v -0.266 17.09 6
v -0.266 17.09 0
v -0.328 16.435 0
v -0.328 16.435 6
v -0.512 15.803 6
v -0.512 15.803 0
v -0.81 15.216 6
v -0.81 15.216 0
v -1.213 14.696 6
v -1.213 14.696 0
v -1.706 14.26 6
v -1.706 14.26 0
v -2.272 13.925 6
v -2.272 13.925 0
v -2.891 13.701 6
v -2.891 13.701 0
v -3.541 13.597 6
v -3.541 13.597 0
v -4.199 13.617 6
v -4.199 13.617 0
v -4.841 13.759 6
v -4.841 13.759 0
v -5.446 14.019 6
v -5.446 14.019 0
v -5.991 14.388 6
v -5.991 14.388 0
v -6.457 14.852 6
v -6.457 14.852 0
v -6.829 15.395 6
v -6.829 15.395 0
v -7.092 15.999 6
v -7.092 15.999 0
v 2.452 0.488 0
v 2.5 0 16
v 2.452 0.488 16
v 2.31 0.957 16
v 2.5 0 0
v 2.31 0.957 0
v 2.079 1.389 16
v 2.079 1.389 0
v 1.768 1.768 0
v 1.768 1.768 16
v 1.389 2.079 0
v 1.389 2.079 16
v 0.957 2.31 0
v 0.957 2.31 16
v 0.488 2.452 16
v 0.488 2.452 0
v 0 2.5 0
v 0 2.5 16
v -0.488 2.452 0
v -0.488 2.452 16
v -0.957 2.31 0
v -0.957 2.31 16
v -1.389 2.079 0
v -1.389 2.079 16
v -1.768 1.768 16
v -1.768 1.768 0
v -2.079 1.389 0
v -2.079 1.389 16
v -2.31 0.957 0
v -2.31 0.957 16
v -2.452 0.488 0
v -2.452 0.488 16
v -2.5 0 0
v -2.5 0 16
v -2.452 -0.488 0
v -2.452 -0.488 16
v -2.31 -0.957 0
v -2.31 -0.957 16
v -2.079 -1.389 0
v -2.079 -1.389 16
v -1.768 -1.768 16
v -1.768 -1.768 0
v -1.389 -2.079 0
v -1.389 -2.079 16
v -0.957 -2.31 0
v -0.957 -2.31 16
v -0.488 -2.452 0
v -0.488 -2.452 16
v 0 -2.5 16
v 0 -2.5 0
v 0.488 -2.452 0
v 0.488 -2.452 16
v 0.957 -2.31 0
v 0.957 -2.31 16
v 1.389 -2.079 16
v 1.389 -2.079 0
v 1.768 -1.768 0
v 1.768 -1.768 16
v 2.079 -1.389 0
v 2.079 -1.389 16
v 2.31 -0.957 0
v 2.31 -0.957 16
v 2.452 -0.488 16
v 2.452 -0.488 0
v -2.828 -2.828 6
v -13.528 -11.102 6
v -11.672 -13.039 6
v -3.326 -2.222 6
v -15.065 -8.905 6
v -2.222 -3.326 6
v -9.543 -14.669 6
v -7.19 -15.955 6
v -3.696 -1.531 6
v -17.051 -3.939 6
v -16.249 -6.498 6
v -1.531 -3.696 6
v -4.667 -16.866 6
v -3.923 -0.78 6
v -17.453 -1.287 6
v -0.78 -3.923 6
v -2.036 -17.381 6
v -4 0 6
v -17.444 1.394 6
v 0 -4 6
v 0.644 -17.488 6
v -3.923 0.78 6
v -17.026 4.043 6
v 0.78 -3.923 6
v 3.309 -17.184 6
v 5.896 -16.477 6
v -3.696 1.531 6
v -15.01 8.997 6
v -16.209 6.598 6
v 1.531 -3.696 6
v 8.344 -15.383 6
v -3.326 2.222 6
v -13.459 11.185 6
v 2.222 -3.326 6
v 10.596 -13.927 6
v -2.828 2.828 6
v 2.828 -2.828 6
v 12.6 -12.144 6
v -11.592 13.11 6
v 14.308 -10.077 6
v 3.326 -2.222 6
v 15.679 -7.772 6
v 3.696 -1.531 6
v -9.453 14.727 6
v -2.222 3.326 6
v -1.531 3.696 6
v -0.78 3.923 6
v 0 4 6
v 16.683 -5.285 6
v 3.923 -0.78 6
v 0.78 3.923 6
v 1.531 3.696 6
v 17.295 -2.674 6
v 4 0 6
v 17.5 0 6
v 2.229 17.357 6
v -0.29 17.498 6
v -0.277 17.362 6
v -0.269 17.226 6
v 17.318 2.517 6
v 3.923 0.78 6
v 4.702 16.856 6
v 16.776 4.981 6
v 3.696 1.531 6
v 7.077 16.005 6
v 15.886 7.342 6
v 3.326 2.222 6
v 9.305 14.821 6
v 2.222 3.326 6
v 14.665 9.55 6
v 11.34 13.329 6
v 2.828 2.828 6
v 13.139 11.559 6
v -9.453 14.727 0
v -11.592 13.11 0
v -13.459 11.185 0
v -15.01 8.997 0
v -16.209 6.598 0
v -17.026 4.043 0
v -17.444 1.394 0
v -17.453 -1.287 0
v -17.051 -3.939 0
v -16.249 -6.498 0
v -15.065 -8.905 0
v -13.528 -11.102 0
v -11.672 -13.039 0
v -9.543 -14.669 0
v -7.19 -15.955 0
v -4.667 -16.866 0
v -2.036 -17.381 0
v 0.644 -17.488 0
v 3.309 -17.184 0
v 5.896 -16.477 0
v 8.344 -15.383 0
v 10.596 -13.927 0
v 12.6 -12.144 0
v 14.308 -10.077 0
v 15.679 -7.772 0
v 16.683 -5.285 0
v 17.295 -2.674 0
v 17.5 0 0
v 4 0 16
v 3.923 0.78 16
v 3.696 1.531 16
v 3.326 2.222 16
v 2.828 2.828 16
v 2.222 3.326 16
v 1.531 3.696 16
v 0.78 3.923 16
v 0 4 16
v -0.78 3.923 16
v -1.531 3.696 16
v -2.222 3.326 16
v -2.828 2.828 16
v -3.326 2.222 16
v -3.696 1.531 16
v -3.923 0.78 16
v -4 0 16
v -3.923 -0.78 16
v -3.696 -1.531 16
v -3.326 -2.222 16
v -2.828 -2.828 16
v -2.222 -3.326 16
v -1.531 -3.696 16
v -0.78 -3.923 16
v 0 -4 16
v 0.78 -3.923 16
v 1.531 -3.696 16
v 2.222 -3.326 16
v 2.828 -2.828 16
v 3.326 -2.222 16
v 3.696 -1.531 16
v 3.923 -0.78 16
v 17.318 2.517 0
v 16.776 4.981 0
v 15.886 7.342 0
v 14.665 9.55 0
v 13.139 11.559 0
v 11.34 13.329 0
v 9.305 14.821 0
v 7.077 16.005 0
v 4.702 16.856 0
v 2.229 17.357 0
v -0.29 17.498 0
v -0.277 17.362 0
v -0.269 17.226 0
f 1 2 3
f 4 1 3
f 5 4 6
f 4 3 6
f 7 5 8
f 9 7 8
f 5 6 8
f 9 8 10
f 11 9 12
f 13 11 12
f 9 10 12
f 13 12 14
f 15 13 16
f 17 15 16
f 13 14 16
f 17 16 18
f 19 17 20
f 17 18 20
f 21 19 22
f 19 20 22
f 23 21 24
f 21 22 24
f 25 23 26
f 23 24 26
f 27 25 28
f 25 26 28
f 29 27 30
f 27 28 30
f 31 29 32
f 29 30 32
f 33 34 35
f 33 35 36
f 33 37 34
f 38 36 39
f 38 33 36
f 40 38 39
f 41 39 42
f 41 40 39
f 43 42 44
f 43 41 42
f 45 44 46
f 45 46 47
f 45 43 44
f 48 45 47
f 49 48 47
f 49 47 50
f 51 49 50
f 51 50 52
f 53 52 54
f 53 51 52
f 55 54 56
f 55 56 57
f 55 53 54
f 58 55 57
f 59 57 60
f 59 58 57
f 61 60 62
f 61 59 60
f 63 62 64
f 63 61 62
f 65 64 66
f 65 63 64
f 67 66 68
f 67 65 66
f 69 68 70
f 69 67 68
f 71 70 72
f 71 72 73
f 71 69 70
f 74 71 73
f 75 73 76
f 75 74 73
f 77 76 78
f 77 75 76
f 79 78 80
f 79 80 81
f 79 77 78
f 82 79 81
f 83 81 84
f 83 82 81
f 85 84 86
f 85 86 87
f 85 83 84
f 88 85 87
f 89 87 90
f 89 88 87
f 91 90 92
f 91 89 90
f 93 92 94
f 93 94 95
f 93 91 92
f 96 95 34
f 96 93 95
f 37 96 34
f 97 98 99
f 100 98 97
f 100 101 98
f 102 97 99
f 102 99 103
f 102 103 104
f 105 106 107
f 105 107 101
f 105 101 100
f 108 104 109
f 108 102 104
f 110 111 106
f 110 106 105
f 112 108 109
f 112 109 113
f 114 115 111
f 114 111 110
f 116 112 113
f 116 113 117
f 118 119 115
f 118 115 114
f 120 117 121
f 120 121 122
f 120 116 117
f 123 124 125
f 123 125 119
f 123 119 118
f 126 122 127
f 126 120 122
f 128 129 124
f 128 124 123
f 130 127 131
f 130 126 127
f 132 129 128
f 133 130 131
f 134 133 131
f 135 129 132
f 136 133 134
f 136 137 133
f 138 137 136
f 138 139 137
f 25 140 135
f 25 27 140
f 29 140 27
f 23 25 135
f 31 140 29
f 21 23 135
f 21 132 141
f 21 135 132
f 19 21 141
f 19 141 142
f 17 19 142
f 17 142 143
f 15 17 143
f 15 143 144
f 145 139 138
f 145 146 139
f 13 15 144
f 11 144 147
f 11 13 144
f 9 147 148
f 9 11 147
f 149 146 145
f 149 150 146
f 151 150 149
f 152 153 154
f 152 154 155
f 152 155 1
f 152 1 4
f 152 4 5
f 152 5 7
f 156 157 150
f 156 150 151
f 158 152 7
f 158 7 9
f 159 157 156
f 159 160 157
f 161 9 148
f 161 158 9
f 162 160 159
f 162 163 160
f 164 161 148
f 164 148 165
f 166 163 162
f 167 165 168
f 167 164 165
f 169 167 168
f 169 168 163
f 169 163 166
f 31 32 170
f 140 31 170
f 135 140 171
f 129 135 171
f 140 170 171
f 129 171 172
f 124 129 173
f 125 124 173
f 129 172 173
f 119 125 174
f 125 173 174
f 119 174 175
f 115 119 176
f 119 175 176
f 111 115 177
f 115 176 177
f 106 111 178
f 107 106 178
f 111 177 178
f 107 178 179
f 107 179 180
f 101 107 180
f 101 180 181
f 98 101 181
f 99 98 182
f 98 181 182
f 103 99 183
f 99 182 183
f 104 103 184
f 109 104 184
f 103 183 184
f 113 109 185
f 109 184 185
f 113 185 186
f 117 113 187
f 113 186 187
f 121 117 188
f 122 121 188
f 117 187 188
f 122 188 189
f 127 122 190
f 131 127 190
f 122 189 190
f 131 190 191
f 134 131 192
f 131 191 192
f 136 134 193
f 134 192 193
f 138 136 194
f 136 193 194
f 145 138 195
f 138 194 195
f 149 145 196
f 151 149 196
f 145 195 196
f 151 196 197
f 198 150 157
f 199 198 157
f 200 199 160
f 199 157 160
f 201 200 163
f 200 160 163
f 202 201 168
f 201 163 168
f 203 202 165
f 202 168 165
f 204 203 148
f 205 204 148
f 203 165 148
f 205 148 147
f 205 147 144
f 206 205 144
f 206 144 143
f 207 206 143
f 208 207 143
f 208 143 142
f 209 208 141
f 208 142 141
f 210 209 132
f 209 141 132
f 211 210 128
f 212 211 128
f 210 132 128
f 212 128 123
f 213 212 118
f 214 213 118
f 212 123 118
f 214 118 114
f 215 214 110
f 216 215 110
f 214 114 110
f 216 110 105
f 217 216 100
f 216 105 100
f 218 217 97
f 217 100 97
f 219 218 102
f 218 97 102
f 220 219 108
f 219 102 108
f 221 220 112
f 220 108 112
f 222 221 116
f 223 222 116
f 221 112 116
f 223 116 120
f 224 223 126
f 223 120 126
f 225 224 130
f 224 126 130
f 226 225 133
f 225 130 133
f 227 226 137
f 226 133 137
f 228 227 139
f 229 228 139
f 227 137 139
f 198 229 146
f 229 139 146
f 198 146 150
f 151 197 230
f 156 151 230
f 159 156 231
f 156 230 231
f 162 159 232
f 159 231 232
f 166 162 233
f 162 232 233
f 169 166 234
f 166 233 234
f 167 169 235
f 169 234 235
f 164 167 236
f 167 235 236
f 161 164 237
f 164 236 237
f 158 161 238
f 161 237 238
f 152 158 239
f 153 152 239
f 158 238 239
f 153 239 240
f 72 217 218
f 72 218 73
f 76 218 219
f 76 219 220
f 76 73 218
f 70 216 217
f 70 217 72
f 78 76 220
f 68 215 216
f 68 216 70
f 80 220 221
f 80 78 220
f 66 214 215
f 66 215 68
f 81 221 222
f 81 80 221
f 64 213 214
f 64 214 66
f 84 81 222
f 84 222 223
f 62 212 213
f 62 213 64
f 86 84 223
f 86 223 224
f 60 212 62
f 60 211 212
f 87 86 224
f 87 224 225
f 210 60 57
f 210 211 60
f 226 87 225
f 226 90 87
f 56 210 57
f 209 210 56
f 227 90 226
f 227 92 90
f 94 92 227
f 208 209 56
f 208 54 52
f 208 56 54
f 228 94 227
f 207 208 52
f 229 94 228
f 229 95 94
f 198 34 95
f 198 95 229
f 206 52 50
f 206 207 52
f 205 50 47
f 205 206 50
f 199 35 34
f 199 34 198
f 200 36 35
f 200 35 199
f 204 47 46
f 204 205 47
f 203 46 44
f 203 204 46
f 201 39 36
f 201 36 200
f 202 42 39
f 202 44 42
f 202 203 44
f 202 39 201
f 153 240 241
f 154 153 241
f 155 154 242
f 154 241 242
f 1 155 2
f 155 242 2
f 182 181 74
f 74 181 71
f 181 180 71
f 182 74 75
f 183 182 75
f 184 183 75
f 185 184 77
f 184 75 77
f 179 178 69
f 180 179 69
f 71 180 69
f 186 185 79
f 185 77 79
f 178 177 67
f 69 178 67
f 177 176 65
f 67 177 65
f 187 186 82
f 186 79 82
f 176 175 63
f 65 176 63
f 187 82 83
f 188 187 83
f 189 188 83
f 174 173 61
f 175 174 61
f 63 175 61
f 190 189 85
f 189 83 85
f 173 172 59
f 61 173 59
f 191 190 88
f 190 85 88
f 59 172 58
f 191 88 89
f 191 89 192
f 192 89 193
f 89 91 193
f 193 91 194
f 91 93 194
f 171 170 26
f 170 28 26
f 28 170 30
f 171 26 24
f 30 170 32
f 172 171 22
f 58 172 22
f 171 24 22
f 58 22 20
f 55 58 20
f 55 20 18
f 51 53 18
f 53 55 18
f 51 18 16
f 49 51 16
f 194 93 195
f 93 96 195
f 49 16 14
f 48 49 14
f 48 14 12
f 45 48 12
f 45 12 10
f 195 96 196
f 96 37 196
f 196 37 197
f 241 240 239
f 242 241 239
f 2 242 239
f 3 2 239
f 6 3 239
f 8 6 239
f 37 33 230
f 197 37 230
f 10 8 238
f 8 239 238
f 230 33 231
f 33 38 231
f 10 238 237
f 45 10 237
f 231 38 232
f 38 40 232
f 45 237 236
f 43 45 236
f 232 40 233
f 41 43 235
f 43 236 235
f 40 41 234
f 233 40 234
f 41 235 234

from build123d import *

# Parameters (mm, degrees)
F0_R     = 2.5
F1_DEPTH = 6
F2_R     = 4
F2_R_2   = 2.5
F3_DEPTH = 10


with BuildPart() as f1:
    # F0 (on Top) → F1 (new body)
    with BuildSketch(Plane.XY):
        with BuildLine():
            ThreePointArc((-7.091841, 15.998619), (-9.543133, -14.668967), (17.5, 0))
            ThreePointArc((17.5, 0), (12.271358, 12.476529), (-0.290145, 17.497595))
            ThreePointArc((-0.290145, 17.497595), (-0.27228, 17.294097), (-0.266319, 17.089905))
            ThreePointArc((-0.266319, 17.089905), (-3.213746, 13.633799), (-7.091841, 15.998619))
        make_face()
        Circle(F0_R, mode=Mode.SUBTRACT)
    extrude(amount=F1_DEPTH)

    # F2 (on face) → F3 (join)
    with BuildSketch(Plane.XY.offset(6)):
        Circle(F2_R)
        Circle(F2_R_2, mode=Mode.SUBTRACT)
    extrude(amount=F3_DEPTH)


solid = f1.part
